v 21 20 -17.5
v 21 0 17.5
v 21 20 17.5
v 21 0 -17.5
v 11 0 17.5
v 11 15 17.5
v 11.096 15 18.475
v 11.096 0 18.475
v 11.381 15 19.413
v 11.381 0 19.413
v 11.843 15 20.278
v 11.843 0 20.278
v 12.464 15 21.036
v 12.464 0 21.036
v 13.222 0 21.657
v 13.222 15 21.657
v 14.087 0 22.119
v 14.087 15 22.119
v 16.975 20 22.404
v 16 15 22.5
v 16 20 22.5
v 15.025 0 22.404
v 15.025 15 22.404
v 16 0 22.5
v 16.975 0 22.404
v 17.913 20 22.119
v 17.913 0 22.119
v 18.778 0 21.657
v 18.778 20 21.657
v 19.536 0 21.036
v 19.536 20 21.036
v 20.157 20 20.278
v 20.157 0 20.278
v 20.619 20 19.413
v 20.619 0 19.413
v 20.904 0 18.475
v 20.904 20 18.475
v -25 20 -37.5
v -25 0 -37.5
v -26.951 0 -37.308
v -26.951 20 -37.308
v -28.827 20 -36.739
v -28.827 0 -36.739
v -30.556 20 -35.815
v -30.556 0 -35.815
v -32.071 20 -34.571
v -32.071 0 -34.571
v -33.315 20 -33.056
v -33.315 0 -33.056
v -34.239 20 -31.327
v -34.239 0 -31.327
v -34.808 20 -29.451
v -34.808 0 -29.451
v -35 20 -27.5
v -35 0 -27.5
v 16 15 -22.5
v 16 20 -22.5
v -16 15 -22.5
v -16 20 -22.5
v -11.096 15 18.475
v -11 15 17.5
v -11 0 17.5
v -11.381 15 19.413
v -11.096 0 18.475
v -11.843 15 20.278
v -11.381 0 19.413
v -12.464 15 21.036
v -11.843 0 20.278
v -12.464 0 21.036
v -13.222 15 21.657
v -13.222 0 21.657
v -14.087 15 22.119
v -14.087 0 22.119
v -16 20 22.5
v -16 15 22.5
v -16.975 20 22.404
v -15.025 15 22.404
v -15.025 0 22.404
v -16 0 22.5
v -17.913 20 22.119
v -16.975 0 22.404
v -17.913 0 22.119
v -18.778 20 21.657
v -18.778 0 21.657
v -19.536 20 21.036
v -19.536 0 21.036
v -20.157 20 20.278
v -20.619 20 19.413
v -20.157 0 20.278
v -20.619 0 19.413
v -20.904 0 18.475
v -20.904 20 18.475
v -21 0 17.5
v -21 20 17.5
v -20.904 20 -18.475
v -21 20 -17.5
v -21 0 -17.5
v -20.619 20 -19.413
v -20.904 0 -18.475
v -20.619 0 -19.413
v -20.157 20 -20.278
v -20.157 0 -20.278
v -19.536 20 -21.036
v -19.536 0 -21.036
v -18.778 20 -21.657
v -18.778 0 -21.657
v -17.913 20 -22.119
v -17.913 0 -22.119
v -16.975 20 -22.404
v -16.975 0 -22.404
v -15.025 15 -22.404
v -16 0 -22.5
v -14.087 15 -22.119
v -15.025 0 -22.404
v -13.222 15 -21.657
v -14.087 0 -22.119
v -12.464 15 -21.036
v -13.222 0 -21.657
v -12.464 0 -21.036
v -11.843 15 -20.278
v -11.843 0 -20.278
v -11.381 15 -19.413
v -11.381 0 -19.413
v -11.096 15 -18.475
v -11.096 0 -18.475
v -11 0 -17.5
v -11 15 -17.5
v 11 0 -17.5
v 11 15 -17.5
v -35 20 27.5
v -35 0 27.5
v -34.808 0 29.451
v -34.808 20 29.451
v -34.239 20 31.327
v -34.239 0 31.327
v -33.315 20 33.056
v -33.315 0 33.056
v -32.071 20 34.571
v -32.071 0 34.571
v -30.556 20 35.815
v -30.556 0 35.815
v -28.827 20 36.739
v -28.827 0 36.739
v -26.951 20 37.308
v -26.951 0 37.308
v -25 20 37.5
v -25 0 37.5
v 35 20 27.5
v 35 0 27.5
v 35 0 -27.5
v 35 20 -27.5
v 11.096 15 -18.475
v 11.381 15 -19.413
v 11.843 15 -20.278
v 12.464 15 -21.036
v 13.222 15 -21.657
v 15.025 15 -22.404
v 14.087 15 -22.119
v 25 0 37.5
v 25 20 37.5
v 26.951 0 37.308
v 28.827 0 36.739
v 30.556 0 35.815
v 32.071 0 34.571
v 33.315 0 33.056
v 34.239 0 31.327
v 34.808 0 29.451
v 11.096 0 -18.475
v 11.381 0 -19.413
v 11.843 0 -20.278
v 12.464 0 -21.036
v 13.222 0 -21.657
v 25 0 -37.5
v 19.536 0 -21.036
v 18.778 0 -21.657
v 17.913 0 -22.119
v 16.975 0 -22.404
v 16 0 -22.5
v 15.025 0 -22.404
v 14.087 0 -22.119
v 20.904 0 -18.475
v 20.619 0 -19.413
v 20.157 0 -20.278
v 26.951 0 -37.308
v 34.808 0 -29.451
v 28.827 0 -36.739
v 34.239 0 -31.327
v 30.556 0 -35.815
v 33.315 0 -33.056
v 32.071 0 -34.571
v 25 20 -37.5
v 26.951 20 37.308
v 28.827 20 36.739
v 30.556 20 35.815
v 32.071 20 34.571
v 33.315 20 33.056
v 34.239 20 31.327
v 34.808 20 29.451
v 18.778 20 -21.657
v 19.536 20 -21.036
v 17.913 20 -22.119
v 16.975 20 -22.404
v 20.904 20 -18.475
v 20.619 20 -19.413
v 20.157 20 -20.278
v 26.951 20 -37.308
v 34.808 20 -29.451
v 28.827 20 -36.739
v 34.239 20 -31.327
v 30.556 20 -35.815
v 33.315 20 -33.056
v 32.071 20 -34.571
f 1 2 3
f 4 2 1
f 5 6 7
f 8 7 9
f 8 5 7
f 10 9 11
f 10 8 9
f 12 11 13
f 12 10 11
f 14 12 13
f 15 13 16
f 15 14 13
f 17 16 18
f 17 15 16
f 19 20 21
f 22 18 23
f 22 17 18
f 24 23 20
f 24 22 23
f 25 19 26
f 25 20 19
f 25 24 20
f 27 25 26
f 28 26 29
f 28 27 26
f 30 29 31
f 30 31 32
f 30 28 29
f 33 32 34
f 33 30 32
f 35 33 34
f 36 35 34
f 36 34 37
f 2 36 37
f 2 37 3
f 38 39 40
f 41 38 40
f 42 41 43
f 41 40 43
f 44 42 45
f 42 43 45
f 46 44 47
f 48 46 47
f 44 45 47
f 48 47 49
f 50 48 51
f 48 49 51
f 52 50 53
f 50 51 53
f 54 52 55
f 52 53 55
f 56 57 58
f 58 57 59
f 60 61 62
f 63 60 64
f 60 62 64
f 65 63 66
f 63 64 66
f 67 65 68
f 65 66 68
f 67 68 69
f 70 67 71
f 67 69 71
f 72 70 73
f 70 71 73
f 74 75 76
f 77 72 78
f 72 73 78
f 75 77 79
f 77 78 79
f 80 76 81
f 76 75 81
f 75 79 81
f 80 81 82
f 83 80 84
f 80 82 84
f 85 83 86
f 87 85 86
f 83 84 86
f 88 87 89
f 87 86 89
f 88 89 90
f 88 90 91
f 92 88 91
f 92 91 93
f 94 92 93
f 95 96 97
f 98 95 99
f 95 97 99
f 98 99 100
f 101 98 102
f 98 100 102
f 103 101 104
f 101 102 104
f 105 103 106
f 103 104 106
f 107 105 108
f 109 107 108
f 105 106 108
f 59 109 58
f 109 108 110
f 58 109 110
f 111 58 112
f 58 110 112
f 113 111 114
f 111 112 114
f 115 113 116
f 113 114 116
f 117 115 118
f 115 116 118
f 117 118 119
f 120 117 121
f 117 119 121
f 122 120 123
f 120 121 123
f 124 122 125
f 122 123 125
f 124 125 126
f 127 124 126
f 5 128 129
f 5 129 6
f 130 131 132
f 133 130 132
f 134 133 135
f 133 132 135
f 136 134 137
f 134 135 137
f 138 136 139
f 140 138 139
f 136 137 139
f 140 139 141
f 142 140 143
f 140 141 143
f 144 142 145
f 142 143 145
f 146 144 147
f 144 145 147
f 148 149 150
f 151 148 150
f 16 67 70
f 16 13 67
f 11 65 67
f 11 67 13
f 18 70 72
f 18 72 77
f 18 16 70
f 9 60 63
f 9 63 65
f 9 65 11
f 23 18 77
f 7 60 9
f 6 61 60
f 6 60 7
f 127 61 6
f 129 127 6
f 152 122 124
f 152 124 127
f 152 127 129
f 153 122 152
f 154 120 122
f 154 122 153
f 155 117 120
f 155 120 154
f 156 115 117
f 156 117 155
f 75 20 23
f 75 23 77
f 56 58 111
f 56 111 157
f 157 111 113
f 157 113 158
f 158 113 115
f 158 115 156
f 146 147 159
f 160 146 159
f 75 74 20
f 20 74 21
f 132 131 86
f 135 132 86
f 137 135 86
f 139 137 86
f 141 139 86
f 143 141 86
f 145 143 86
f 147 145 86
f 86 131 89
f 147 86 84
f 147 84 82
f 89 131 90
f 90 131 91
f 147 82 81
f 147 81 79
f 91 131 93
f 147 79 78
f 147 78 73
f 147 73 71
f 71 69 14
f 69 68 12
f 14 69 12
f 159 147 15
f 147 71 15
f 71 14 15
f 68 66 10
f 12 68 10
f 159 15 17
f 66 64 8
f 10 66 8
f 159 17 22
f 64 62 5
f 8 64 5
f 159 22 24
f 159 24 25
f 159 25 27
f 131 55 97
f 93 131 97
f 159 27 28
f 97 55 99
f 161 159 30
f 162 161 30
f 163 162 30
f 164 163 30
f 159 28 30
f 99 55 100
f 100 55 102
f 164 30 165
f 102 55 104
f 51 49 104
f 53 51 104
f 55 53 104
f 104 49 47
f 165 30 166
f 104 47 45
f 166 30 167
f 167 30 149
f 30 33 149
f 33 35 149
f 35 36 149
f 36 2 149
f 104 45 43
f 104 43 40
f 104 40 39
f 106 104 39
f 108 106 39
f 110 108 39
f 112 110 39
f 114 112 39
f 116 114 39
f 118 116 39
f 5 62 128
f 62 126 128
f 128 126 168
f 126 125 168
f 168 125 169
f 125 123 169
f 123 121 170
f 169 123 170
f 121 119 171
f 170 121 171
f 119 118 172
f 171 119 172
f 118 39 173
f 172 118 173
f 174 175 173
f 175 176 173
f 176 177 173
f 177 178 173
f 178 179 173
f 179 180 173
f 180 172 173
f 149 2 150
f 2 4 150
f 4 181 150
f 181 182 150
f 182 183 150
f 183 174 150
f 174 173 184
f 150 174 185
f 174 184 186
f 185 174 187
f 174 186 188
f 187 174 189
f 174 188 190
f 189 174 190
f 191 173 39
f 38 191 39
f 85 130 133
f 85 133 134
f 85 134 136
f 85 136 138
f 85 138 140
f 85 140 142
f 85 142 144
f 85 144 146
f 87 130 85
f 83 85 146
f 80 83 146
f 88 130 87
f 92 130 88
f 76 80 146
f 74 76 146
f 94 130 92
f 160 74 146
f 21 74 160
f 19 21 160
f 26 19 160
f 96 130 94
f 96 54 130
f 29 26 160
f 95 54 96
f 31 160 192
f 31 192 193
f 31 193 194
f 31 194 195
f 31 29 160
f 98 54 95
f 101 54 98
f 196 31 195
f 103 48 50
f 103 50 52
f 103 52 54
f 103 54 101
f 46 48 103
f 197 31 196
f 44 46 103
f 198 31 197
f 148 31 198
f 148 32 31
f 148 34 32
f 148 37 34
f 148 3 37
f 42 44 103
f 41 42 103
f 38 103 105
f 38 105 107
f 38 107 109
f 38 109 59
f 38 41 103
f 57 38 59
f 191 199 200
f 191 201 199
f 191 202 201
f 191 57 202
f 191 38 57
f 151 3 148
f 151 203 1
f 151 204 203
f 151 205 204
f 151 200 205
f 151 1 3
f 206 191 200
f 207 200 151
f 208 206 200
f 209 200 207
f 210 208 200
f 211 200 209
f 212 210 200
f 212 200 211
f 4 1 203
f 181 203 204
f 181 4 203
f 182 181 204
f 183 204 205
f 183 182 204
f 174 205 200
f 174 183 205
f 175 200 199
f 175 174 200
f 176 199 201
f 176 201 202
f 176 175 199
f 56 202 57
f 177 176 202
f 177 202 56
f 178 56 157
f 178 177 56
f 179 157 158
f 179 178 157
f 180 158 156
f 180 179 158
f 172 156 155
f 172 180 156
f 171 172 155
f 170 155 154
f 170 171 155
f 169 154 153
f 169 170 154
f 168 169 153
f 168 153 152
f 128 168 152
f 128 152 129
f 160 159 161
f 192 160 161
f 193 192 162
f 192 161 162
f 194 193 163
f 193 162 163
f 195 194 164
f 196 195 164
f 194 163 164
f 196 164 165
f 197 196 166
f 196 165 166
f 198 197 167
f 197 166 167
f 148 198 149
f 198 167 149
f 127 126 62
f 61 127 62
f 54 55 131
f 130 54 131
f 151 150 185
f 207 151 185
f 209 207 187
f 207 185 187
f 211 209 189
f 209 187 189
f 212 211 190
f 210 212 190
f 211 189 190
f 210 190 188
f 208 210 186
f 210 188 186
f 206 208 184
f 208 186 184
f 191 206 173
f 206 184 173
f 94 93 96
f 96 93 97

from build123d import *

# Parameters (mm, degrees)
BOSS_EXTRUDE1_DEPTH = 20
CUT_EXTRUDE1_DEPTH  = 5


with BuildPart() as part:
    # Sketch1 → Boss-Extrude1 (new body)
    with BuildSketch(Plane(origin=(0, 0, 0), x_dir=(1, 0, 0), z_dir=(0, 1, 0))):
        with BuildLine():
            Line((-25, -37.5), (25, -37.5))
            ThreePointArc((25, -37.5), (32.071067812, -34.571067812), (35, -27.5))
            Line((35, -27.5), (35, 27.5))
            ThreePointArc((35, 27.5), (32.071067812, 34.571067812), (25, 37.5))
            Line((25, 37.5), (-25, 37.5))
            ThreePointArc((-25, 37.5), (-32.071067812, 34.571067812), (-35, 27.5))
            Line((-35, 27.5), (-35, -27.5))
            ThreePointArc((-35, -27.5), (-32.071067812, -34.571067812), (-25, -37.5))
        make_face()
        with BuildLine():
            Line((-21, -17.5), (-21, 17.5))
            ThreePointArc((-21, 17.5), (-16, 22.5), (-11, 17.5))
            Line((-11, 17.5), (-11, -17.5))
            ThreePointArc((-11, -17.5), (-16, -22.5), (-21, -17.5))
        make_face(mode=Mode.SUBTRACT)
        with BuildLine():
            Line((21, -17.5), (21, 17.5))
            ThreePointArc((21, 17.5), (16, 22.5), (11, 17.5))
            Line((11, 17.5), (11, -17.5))
            ThreePointArc((11, -17.5), (16, -22.5), (21, -17.5))
        make_face(mode=Mode.SUBTRACT)
    extrude(amount=BOSS_EXTRUDE1_DEPTH)

    # Sketch2 → Cut-Extrude1 (cut)
    with BuildSketch(Plane(origin=(0, 20, 0), x_dir=(1, 0, 0), z_dir=(0, 1, 0))):
        with BuildLine():
            Line((-16, -22.5), (16, -22.5))
            ThreePointArc((16, -22.5), (12.464466094, -21.035533906), (11, -17.5))
            Line((11, -17.5), (11, 17.5))
            ThreePointArc((11, 17.5), (12.464466094, 21.035533906), (16, 22.5))
            Line((16, 22.5), (-16, 22.5))
            ThreePointArc((-16, 22.5), (-12.464466094, 21.035533906), (-11, 17.5))
            Line((-11, 17.5), (-11, -17.5))
            ThreePointArc((-11, -17.5), (-12.464466094, -21.035533906), (-16, -22.5))
        make_face()
    extrude(amount=-CUT_EXTRUDE1_DEPTH, mode=Mode.SUBTRACT)


solid = part.part
